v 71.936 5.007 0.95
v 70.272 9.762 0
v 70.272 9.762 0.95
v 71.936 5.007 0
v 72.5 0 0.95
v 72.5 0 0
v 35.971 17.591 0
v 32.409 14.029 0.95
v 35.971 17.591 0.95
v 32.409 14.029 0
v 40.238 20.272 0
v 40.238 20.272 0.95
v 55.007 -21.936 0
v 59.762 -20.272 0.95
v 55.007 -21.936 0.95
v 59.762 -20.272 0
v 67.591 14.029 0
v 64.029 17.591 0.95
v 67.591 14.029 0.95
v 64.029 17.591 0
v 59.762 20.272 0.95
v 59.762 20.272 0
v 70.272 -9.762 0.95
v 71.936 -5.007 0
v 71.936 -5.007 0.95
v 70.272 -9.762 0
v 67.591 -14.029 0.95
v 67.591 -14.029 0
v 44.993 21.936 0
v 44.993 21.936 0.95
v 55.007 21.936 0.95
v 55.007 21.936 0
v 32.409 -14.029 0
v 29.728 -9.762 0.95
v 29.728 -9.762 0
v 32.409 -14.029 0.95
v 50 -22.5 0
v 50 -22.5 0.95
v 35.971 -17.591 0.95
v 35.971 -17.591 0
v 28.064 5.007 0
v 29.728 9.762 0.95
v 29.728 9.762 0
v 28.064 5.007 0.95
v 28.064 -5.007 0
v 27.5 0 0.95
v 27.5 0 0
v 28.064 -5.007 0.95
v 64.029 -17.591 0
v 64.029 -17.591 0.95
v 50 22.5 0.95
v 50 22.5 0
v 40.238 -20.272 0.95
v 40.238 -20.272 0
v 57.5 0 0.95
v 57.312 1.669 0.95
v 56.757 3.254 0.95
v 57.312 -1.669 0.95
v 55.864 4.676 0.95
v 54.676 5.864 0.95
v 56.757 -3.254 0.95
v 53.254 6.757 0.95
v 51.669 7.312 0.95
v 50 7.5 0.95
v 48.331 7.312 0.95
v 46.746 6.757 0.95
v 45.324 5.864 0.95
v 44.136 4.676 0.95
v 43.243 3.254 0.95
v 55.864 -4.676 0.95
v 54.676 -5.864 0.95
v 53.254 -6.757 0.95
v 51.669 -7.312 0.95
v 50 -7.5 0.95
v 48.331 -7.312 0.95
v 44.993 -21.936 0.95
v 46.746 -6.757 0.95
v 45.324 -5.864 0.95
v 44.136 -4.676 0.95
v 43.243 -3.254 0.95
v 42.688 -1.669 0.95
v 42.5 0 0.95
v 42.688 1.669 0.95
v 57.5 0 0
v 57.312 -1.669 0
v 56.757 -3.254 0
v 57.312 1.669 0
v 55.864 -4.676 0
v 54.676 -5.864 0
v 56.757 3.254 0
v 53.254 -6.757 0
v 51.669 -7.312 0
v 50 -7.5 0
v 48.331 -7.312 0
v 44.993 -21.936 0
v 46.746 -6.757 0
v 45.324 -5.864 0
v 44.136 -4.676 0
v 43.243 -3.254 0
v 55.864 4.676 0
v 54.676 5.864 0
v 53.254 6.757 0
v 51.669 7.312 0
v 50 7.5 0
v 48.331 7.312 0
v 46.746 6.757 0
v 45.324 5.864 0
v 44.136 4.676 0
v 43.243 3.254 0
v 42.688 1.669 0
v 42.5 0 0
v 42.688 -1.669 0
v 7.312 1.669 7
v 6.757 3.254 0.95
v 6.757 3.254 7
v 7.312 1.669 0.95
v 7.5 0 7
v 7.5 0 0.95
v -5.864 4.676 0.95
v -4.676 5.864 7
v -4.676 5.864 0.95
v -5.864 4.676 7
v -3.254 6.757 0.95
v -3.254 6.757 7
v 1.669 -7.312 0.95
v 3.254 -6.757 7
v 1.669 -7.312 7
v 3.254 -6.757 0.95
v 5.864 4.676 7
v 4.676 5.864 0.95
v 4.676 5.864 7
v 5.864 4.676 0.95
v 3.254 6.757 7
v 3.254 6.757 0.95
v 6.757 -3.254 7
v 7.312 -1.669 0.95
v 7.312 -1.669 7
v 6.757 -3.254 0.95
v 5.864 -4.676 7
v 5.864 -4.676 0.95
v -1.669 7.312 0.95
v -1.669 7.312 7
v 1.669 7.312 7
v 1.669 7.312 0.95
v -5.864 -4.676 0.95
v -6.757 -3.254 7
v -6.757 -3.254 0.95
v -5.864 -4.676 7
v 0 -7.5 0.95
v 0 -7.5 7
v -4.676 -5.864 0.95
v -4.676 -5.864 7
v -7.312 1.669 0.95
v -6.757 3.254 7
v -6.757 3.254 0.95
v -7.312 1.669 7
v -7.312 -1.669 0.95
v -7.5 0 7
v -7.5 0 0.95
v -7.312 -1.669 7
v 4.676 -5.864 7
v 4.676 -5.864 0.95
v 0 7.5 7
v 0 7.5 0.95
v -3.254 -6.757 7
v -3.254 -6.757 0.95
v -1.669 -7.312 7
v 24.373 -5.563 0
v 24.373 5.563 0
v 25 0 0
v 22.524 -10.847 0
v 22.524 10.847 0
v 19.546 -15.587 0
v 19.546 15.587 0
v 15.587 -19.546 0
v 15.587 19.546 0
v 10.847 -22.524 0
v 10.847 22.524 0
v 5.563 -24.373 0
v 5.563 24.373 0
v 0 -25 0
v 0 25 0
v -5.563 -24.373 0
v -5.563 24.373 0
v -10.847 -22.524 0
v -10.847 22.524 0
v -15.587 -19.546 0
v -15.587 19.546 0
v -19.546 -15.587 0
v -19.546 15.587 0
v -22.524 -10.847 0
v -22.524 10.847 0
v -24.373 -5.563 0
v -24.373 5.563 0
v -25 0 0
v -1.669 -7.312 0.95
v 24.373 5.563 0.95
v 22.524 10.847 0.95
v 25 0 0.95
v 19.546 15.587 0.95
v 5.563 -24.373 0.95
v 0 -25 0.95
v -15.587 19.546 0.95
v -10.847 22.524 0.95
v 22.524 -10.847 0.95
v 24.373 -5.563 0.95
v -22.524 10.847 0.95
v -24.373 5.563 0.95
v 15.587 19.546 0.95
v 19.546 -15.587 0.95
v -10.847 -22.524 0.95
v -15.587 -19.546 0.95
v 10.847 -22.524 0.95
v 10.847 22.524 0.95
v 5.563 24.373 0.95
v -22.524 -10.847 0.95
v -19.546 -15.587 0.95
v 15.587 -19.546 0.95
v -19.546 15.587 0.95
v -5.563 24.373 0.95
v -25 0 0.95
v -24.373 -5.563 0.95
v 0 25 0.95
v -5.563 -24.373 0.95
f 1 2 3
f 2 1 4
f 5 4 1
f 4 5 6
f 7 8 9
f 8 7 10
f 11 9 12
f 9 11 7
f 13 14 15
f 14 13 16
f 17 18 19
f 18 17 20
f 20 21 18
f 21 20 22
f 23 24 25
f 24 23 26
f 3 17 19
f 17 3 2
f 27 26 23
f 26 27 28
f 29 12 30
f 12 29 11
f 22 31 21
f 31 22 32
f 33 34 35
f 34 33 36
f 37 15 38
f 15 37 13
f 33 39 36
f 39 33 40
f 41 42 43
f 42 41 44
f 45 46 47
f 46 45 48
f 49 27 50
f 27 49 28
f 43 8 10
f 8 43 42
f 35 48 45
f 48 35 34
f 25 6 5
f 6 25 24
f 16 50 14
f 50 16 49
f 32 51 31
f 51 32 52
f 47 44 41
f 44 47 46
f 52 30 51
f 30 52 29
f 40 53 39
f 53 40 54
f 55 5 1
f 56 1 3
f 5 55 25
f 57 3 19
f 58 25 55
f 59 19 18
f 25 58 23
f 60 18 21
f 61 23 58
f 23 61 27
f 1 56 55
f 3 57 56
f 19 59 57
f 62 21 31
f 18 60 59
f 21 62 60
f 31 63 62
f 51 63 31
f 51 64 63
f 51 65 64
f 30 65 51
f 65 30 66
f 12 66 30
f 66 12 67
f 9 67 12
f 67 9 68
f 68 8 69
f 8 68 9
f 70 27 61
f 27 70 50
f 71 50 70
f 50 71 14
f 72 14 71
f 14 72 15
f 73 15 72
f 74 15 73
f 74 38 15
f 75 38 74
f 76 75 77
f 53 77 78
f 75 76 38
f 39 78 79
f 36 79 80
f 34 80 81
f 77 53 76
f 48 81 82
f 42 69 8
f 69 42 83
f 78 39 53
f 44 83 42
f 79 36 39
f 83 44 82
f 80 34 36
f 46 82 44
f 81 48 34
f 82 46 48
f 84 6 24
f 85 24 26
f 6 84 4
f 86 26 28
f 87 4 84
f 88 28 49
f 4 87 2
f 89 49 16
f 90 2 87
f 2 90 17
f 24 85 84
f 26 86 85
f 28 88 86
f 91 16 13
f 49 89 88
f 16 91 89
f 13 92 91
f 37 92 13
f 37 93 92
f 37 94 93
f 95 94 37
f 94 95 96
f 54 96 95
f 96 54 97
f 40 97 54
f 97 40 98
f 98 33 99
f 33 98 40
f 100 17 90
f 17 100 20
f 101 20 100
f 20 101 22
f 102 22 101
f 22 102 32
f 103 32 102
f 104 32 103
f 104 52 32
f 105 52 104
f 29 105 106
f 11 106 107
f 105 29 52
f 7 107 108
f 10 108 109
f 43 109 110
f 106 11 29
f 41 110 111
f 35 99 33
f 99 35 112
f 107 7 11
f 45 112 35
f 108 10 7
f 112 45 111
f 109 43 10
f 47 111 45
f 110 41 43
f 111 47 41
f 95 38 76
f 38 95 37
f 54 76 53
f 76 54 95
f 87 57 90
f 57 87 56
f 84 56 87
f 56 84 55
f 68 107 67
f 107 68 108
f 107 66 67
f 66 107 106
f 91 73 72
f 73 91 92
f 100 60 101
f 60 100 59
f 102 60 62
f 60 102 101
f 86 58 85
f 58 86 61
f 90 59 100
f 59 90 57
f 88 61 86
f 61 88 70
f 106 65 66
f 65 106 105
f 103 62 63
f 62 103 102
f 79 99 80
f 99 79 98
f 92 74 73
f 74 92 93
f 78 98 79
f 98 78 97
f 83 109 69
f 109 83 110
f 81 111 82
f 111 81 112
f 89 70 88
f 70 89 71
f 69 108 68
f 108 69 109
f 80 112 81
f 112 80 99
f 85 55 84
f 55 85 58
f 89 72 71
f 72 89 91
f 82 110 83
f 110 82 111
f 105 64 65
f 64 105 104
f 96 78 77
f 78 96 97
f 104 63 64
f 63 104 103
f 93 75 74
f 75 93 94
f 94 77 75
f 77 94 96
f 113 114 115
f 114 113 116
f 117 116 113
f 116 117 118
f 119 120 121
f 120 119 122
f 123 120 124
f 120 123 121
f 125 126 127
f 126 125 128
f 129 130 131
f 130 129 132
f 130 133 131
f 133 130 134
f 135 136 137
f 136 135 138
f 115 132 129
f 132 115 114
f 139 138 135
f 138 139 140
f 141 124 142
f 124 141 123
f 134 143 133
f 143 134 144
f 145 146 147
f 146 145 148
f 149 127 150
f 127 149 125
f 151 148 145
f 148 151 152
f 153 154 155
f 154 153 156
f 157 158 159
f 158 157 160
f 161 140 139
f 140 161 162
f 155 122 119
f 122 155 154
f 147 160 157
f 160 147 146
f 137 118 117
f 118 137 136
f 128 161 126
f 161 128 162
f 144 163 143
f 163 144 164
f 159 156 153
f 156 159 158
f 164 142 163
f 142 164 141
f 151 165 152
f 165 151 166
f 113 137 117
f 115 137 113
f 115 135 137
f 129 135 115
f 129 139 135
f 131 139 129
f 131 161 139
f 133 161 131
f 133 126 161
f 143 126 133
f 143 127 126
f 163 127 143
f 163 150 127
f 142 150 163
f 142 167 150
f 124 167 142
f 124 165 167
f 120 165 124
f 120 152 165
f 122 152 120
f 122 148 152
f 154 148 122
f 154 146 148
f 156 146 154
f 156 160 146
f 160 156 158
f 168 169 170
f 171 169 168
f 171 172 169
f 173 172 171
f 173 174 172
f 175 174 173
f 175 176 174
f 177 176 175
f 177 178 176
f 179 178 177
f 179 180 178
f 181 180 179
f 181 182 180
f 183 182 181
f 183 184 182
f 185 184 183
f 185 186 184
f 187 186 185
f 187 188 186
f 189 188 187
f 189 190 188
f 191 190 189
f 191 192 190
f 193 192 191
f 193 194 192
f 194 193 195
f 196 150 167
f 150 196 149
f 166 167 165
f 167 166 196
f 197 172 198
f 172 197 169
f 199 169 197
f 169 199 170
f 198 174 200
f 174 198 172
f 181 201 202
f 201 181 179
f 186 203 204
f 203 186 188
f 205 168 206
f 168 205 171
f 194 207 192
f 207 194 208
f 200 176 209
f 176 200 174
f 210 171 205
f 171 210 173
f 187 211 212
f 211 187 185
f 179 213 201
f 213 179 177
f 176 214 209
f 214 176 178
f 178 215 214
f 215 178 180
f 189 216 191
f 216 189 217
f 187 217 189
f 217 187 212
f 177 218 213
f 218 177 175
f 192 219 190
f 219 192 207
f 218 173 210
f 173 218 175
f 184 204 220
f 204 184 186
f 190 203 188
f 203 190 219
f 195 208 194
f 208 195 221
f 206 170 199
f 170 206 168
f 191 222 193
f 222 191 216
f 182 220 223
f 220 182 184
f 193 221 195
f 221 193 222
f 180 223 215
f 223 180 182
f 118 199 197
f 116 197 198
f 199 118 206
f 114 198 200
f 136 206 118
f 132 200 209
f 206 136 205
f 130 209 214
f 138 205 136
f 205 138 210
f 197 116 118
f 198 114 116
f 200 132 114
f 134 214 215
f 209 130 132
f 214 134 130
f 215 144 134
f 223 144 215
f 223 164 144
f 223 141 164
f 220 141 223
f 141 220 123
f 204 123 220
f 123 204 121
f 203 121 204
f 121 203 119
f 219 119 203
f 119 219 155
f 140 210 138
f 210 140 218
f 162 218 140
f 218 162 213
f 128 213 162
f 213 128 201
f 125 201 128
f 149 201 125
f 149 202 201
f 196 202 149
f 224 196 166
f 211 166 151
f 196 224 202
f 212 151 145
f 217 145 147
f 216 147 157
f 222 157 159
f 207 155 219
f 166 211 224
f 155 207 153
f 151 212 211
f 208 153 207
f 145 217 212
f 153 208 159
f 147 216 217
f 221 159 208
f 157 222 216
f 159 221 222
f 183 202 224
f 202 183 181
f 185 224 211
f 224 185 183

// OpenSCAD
$fn=7*4;

di=15;
do=50;

h3=20;
h2=7;
h1=0.25+0.35*2;

//translate([0,0,0])




translate([0,0,0])
cylinder(d=di,h=h2);
cylinder(d=do,h=h1);



translate([50,0,0])
cover();



module cover(c=0)
{
    difference()
    {
        cylinder(d=do*0.90,h=h1);
        cylinder(d=di+c,h=h1);
    }
}
